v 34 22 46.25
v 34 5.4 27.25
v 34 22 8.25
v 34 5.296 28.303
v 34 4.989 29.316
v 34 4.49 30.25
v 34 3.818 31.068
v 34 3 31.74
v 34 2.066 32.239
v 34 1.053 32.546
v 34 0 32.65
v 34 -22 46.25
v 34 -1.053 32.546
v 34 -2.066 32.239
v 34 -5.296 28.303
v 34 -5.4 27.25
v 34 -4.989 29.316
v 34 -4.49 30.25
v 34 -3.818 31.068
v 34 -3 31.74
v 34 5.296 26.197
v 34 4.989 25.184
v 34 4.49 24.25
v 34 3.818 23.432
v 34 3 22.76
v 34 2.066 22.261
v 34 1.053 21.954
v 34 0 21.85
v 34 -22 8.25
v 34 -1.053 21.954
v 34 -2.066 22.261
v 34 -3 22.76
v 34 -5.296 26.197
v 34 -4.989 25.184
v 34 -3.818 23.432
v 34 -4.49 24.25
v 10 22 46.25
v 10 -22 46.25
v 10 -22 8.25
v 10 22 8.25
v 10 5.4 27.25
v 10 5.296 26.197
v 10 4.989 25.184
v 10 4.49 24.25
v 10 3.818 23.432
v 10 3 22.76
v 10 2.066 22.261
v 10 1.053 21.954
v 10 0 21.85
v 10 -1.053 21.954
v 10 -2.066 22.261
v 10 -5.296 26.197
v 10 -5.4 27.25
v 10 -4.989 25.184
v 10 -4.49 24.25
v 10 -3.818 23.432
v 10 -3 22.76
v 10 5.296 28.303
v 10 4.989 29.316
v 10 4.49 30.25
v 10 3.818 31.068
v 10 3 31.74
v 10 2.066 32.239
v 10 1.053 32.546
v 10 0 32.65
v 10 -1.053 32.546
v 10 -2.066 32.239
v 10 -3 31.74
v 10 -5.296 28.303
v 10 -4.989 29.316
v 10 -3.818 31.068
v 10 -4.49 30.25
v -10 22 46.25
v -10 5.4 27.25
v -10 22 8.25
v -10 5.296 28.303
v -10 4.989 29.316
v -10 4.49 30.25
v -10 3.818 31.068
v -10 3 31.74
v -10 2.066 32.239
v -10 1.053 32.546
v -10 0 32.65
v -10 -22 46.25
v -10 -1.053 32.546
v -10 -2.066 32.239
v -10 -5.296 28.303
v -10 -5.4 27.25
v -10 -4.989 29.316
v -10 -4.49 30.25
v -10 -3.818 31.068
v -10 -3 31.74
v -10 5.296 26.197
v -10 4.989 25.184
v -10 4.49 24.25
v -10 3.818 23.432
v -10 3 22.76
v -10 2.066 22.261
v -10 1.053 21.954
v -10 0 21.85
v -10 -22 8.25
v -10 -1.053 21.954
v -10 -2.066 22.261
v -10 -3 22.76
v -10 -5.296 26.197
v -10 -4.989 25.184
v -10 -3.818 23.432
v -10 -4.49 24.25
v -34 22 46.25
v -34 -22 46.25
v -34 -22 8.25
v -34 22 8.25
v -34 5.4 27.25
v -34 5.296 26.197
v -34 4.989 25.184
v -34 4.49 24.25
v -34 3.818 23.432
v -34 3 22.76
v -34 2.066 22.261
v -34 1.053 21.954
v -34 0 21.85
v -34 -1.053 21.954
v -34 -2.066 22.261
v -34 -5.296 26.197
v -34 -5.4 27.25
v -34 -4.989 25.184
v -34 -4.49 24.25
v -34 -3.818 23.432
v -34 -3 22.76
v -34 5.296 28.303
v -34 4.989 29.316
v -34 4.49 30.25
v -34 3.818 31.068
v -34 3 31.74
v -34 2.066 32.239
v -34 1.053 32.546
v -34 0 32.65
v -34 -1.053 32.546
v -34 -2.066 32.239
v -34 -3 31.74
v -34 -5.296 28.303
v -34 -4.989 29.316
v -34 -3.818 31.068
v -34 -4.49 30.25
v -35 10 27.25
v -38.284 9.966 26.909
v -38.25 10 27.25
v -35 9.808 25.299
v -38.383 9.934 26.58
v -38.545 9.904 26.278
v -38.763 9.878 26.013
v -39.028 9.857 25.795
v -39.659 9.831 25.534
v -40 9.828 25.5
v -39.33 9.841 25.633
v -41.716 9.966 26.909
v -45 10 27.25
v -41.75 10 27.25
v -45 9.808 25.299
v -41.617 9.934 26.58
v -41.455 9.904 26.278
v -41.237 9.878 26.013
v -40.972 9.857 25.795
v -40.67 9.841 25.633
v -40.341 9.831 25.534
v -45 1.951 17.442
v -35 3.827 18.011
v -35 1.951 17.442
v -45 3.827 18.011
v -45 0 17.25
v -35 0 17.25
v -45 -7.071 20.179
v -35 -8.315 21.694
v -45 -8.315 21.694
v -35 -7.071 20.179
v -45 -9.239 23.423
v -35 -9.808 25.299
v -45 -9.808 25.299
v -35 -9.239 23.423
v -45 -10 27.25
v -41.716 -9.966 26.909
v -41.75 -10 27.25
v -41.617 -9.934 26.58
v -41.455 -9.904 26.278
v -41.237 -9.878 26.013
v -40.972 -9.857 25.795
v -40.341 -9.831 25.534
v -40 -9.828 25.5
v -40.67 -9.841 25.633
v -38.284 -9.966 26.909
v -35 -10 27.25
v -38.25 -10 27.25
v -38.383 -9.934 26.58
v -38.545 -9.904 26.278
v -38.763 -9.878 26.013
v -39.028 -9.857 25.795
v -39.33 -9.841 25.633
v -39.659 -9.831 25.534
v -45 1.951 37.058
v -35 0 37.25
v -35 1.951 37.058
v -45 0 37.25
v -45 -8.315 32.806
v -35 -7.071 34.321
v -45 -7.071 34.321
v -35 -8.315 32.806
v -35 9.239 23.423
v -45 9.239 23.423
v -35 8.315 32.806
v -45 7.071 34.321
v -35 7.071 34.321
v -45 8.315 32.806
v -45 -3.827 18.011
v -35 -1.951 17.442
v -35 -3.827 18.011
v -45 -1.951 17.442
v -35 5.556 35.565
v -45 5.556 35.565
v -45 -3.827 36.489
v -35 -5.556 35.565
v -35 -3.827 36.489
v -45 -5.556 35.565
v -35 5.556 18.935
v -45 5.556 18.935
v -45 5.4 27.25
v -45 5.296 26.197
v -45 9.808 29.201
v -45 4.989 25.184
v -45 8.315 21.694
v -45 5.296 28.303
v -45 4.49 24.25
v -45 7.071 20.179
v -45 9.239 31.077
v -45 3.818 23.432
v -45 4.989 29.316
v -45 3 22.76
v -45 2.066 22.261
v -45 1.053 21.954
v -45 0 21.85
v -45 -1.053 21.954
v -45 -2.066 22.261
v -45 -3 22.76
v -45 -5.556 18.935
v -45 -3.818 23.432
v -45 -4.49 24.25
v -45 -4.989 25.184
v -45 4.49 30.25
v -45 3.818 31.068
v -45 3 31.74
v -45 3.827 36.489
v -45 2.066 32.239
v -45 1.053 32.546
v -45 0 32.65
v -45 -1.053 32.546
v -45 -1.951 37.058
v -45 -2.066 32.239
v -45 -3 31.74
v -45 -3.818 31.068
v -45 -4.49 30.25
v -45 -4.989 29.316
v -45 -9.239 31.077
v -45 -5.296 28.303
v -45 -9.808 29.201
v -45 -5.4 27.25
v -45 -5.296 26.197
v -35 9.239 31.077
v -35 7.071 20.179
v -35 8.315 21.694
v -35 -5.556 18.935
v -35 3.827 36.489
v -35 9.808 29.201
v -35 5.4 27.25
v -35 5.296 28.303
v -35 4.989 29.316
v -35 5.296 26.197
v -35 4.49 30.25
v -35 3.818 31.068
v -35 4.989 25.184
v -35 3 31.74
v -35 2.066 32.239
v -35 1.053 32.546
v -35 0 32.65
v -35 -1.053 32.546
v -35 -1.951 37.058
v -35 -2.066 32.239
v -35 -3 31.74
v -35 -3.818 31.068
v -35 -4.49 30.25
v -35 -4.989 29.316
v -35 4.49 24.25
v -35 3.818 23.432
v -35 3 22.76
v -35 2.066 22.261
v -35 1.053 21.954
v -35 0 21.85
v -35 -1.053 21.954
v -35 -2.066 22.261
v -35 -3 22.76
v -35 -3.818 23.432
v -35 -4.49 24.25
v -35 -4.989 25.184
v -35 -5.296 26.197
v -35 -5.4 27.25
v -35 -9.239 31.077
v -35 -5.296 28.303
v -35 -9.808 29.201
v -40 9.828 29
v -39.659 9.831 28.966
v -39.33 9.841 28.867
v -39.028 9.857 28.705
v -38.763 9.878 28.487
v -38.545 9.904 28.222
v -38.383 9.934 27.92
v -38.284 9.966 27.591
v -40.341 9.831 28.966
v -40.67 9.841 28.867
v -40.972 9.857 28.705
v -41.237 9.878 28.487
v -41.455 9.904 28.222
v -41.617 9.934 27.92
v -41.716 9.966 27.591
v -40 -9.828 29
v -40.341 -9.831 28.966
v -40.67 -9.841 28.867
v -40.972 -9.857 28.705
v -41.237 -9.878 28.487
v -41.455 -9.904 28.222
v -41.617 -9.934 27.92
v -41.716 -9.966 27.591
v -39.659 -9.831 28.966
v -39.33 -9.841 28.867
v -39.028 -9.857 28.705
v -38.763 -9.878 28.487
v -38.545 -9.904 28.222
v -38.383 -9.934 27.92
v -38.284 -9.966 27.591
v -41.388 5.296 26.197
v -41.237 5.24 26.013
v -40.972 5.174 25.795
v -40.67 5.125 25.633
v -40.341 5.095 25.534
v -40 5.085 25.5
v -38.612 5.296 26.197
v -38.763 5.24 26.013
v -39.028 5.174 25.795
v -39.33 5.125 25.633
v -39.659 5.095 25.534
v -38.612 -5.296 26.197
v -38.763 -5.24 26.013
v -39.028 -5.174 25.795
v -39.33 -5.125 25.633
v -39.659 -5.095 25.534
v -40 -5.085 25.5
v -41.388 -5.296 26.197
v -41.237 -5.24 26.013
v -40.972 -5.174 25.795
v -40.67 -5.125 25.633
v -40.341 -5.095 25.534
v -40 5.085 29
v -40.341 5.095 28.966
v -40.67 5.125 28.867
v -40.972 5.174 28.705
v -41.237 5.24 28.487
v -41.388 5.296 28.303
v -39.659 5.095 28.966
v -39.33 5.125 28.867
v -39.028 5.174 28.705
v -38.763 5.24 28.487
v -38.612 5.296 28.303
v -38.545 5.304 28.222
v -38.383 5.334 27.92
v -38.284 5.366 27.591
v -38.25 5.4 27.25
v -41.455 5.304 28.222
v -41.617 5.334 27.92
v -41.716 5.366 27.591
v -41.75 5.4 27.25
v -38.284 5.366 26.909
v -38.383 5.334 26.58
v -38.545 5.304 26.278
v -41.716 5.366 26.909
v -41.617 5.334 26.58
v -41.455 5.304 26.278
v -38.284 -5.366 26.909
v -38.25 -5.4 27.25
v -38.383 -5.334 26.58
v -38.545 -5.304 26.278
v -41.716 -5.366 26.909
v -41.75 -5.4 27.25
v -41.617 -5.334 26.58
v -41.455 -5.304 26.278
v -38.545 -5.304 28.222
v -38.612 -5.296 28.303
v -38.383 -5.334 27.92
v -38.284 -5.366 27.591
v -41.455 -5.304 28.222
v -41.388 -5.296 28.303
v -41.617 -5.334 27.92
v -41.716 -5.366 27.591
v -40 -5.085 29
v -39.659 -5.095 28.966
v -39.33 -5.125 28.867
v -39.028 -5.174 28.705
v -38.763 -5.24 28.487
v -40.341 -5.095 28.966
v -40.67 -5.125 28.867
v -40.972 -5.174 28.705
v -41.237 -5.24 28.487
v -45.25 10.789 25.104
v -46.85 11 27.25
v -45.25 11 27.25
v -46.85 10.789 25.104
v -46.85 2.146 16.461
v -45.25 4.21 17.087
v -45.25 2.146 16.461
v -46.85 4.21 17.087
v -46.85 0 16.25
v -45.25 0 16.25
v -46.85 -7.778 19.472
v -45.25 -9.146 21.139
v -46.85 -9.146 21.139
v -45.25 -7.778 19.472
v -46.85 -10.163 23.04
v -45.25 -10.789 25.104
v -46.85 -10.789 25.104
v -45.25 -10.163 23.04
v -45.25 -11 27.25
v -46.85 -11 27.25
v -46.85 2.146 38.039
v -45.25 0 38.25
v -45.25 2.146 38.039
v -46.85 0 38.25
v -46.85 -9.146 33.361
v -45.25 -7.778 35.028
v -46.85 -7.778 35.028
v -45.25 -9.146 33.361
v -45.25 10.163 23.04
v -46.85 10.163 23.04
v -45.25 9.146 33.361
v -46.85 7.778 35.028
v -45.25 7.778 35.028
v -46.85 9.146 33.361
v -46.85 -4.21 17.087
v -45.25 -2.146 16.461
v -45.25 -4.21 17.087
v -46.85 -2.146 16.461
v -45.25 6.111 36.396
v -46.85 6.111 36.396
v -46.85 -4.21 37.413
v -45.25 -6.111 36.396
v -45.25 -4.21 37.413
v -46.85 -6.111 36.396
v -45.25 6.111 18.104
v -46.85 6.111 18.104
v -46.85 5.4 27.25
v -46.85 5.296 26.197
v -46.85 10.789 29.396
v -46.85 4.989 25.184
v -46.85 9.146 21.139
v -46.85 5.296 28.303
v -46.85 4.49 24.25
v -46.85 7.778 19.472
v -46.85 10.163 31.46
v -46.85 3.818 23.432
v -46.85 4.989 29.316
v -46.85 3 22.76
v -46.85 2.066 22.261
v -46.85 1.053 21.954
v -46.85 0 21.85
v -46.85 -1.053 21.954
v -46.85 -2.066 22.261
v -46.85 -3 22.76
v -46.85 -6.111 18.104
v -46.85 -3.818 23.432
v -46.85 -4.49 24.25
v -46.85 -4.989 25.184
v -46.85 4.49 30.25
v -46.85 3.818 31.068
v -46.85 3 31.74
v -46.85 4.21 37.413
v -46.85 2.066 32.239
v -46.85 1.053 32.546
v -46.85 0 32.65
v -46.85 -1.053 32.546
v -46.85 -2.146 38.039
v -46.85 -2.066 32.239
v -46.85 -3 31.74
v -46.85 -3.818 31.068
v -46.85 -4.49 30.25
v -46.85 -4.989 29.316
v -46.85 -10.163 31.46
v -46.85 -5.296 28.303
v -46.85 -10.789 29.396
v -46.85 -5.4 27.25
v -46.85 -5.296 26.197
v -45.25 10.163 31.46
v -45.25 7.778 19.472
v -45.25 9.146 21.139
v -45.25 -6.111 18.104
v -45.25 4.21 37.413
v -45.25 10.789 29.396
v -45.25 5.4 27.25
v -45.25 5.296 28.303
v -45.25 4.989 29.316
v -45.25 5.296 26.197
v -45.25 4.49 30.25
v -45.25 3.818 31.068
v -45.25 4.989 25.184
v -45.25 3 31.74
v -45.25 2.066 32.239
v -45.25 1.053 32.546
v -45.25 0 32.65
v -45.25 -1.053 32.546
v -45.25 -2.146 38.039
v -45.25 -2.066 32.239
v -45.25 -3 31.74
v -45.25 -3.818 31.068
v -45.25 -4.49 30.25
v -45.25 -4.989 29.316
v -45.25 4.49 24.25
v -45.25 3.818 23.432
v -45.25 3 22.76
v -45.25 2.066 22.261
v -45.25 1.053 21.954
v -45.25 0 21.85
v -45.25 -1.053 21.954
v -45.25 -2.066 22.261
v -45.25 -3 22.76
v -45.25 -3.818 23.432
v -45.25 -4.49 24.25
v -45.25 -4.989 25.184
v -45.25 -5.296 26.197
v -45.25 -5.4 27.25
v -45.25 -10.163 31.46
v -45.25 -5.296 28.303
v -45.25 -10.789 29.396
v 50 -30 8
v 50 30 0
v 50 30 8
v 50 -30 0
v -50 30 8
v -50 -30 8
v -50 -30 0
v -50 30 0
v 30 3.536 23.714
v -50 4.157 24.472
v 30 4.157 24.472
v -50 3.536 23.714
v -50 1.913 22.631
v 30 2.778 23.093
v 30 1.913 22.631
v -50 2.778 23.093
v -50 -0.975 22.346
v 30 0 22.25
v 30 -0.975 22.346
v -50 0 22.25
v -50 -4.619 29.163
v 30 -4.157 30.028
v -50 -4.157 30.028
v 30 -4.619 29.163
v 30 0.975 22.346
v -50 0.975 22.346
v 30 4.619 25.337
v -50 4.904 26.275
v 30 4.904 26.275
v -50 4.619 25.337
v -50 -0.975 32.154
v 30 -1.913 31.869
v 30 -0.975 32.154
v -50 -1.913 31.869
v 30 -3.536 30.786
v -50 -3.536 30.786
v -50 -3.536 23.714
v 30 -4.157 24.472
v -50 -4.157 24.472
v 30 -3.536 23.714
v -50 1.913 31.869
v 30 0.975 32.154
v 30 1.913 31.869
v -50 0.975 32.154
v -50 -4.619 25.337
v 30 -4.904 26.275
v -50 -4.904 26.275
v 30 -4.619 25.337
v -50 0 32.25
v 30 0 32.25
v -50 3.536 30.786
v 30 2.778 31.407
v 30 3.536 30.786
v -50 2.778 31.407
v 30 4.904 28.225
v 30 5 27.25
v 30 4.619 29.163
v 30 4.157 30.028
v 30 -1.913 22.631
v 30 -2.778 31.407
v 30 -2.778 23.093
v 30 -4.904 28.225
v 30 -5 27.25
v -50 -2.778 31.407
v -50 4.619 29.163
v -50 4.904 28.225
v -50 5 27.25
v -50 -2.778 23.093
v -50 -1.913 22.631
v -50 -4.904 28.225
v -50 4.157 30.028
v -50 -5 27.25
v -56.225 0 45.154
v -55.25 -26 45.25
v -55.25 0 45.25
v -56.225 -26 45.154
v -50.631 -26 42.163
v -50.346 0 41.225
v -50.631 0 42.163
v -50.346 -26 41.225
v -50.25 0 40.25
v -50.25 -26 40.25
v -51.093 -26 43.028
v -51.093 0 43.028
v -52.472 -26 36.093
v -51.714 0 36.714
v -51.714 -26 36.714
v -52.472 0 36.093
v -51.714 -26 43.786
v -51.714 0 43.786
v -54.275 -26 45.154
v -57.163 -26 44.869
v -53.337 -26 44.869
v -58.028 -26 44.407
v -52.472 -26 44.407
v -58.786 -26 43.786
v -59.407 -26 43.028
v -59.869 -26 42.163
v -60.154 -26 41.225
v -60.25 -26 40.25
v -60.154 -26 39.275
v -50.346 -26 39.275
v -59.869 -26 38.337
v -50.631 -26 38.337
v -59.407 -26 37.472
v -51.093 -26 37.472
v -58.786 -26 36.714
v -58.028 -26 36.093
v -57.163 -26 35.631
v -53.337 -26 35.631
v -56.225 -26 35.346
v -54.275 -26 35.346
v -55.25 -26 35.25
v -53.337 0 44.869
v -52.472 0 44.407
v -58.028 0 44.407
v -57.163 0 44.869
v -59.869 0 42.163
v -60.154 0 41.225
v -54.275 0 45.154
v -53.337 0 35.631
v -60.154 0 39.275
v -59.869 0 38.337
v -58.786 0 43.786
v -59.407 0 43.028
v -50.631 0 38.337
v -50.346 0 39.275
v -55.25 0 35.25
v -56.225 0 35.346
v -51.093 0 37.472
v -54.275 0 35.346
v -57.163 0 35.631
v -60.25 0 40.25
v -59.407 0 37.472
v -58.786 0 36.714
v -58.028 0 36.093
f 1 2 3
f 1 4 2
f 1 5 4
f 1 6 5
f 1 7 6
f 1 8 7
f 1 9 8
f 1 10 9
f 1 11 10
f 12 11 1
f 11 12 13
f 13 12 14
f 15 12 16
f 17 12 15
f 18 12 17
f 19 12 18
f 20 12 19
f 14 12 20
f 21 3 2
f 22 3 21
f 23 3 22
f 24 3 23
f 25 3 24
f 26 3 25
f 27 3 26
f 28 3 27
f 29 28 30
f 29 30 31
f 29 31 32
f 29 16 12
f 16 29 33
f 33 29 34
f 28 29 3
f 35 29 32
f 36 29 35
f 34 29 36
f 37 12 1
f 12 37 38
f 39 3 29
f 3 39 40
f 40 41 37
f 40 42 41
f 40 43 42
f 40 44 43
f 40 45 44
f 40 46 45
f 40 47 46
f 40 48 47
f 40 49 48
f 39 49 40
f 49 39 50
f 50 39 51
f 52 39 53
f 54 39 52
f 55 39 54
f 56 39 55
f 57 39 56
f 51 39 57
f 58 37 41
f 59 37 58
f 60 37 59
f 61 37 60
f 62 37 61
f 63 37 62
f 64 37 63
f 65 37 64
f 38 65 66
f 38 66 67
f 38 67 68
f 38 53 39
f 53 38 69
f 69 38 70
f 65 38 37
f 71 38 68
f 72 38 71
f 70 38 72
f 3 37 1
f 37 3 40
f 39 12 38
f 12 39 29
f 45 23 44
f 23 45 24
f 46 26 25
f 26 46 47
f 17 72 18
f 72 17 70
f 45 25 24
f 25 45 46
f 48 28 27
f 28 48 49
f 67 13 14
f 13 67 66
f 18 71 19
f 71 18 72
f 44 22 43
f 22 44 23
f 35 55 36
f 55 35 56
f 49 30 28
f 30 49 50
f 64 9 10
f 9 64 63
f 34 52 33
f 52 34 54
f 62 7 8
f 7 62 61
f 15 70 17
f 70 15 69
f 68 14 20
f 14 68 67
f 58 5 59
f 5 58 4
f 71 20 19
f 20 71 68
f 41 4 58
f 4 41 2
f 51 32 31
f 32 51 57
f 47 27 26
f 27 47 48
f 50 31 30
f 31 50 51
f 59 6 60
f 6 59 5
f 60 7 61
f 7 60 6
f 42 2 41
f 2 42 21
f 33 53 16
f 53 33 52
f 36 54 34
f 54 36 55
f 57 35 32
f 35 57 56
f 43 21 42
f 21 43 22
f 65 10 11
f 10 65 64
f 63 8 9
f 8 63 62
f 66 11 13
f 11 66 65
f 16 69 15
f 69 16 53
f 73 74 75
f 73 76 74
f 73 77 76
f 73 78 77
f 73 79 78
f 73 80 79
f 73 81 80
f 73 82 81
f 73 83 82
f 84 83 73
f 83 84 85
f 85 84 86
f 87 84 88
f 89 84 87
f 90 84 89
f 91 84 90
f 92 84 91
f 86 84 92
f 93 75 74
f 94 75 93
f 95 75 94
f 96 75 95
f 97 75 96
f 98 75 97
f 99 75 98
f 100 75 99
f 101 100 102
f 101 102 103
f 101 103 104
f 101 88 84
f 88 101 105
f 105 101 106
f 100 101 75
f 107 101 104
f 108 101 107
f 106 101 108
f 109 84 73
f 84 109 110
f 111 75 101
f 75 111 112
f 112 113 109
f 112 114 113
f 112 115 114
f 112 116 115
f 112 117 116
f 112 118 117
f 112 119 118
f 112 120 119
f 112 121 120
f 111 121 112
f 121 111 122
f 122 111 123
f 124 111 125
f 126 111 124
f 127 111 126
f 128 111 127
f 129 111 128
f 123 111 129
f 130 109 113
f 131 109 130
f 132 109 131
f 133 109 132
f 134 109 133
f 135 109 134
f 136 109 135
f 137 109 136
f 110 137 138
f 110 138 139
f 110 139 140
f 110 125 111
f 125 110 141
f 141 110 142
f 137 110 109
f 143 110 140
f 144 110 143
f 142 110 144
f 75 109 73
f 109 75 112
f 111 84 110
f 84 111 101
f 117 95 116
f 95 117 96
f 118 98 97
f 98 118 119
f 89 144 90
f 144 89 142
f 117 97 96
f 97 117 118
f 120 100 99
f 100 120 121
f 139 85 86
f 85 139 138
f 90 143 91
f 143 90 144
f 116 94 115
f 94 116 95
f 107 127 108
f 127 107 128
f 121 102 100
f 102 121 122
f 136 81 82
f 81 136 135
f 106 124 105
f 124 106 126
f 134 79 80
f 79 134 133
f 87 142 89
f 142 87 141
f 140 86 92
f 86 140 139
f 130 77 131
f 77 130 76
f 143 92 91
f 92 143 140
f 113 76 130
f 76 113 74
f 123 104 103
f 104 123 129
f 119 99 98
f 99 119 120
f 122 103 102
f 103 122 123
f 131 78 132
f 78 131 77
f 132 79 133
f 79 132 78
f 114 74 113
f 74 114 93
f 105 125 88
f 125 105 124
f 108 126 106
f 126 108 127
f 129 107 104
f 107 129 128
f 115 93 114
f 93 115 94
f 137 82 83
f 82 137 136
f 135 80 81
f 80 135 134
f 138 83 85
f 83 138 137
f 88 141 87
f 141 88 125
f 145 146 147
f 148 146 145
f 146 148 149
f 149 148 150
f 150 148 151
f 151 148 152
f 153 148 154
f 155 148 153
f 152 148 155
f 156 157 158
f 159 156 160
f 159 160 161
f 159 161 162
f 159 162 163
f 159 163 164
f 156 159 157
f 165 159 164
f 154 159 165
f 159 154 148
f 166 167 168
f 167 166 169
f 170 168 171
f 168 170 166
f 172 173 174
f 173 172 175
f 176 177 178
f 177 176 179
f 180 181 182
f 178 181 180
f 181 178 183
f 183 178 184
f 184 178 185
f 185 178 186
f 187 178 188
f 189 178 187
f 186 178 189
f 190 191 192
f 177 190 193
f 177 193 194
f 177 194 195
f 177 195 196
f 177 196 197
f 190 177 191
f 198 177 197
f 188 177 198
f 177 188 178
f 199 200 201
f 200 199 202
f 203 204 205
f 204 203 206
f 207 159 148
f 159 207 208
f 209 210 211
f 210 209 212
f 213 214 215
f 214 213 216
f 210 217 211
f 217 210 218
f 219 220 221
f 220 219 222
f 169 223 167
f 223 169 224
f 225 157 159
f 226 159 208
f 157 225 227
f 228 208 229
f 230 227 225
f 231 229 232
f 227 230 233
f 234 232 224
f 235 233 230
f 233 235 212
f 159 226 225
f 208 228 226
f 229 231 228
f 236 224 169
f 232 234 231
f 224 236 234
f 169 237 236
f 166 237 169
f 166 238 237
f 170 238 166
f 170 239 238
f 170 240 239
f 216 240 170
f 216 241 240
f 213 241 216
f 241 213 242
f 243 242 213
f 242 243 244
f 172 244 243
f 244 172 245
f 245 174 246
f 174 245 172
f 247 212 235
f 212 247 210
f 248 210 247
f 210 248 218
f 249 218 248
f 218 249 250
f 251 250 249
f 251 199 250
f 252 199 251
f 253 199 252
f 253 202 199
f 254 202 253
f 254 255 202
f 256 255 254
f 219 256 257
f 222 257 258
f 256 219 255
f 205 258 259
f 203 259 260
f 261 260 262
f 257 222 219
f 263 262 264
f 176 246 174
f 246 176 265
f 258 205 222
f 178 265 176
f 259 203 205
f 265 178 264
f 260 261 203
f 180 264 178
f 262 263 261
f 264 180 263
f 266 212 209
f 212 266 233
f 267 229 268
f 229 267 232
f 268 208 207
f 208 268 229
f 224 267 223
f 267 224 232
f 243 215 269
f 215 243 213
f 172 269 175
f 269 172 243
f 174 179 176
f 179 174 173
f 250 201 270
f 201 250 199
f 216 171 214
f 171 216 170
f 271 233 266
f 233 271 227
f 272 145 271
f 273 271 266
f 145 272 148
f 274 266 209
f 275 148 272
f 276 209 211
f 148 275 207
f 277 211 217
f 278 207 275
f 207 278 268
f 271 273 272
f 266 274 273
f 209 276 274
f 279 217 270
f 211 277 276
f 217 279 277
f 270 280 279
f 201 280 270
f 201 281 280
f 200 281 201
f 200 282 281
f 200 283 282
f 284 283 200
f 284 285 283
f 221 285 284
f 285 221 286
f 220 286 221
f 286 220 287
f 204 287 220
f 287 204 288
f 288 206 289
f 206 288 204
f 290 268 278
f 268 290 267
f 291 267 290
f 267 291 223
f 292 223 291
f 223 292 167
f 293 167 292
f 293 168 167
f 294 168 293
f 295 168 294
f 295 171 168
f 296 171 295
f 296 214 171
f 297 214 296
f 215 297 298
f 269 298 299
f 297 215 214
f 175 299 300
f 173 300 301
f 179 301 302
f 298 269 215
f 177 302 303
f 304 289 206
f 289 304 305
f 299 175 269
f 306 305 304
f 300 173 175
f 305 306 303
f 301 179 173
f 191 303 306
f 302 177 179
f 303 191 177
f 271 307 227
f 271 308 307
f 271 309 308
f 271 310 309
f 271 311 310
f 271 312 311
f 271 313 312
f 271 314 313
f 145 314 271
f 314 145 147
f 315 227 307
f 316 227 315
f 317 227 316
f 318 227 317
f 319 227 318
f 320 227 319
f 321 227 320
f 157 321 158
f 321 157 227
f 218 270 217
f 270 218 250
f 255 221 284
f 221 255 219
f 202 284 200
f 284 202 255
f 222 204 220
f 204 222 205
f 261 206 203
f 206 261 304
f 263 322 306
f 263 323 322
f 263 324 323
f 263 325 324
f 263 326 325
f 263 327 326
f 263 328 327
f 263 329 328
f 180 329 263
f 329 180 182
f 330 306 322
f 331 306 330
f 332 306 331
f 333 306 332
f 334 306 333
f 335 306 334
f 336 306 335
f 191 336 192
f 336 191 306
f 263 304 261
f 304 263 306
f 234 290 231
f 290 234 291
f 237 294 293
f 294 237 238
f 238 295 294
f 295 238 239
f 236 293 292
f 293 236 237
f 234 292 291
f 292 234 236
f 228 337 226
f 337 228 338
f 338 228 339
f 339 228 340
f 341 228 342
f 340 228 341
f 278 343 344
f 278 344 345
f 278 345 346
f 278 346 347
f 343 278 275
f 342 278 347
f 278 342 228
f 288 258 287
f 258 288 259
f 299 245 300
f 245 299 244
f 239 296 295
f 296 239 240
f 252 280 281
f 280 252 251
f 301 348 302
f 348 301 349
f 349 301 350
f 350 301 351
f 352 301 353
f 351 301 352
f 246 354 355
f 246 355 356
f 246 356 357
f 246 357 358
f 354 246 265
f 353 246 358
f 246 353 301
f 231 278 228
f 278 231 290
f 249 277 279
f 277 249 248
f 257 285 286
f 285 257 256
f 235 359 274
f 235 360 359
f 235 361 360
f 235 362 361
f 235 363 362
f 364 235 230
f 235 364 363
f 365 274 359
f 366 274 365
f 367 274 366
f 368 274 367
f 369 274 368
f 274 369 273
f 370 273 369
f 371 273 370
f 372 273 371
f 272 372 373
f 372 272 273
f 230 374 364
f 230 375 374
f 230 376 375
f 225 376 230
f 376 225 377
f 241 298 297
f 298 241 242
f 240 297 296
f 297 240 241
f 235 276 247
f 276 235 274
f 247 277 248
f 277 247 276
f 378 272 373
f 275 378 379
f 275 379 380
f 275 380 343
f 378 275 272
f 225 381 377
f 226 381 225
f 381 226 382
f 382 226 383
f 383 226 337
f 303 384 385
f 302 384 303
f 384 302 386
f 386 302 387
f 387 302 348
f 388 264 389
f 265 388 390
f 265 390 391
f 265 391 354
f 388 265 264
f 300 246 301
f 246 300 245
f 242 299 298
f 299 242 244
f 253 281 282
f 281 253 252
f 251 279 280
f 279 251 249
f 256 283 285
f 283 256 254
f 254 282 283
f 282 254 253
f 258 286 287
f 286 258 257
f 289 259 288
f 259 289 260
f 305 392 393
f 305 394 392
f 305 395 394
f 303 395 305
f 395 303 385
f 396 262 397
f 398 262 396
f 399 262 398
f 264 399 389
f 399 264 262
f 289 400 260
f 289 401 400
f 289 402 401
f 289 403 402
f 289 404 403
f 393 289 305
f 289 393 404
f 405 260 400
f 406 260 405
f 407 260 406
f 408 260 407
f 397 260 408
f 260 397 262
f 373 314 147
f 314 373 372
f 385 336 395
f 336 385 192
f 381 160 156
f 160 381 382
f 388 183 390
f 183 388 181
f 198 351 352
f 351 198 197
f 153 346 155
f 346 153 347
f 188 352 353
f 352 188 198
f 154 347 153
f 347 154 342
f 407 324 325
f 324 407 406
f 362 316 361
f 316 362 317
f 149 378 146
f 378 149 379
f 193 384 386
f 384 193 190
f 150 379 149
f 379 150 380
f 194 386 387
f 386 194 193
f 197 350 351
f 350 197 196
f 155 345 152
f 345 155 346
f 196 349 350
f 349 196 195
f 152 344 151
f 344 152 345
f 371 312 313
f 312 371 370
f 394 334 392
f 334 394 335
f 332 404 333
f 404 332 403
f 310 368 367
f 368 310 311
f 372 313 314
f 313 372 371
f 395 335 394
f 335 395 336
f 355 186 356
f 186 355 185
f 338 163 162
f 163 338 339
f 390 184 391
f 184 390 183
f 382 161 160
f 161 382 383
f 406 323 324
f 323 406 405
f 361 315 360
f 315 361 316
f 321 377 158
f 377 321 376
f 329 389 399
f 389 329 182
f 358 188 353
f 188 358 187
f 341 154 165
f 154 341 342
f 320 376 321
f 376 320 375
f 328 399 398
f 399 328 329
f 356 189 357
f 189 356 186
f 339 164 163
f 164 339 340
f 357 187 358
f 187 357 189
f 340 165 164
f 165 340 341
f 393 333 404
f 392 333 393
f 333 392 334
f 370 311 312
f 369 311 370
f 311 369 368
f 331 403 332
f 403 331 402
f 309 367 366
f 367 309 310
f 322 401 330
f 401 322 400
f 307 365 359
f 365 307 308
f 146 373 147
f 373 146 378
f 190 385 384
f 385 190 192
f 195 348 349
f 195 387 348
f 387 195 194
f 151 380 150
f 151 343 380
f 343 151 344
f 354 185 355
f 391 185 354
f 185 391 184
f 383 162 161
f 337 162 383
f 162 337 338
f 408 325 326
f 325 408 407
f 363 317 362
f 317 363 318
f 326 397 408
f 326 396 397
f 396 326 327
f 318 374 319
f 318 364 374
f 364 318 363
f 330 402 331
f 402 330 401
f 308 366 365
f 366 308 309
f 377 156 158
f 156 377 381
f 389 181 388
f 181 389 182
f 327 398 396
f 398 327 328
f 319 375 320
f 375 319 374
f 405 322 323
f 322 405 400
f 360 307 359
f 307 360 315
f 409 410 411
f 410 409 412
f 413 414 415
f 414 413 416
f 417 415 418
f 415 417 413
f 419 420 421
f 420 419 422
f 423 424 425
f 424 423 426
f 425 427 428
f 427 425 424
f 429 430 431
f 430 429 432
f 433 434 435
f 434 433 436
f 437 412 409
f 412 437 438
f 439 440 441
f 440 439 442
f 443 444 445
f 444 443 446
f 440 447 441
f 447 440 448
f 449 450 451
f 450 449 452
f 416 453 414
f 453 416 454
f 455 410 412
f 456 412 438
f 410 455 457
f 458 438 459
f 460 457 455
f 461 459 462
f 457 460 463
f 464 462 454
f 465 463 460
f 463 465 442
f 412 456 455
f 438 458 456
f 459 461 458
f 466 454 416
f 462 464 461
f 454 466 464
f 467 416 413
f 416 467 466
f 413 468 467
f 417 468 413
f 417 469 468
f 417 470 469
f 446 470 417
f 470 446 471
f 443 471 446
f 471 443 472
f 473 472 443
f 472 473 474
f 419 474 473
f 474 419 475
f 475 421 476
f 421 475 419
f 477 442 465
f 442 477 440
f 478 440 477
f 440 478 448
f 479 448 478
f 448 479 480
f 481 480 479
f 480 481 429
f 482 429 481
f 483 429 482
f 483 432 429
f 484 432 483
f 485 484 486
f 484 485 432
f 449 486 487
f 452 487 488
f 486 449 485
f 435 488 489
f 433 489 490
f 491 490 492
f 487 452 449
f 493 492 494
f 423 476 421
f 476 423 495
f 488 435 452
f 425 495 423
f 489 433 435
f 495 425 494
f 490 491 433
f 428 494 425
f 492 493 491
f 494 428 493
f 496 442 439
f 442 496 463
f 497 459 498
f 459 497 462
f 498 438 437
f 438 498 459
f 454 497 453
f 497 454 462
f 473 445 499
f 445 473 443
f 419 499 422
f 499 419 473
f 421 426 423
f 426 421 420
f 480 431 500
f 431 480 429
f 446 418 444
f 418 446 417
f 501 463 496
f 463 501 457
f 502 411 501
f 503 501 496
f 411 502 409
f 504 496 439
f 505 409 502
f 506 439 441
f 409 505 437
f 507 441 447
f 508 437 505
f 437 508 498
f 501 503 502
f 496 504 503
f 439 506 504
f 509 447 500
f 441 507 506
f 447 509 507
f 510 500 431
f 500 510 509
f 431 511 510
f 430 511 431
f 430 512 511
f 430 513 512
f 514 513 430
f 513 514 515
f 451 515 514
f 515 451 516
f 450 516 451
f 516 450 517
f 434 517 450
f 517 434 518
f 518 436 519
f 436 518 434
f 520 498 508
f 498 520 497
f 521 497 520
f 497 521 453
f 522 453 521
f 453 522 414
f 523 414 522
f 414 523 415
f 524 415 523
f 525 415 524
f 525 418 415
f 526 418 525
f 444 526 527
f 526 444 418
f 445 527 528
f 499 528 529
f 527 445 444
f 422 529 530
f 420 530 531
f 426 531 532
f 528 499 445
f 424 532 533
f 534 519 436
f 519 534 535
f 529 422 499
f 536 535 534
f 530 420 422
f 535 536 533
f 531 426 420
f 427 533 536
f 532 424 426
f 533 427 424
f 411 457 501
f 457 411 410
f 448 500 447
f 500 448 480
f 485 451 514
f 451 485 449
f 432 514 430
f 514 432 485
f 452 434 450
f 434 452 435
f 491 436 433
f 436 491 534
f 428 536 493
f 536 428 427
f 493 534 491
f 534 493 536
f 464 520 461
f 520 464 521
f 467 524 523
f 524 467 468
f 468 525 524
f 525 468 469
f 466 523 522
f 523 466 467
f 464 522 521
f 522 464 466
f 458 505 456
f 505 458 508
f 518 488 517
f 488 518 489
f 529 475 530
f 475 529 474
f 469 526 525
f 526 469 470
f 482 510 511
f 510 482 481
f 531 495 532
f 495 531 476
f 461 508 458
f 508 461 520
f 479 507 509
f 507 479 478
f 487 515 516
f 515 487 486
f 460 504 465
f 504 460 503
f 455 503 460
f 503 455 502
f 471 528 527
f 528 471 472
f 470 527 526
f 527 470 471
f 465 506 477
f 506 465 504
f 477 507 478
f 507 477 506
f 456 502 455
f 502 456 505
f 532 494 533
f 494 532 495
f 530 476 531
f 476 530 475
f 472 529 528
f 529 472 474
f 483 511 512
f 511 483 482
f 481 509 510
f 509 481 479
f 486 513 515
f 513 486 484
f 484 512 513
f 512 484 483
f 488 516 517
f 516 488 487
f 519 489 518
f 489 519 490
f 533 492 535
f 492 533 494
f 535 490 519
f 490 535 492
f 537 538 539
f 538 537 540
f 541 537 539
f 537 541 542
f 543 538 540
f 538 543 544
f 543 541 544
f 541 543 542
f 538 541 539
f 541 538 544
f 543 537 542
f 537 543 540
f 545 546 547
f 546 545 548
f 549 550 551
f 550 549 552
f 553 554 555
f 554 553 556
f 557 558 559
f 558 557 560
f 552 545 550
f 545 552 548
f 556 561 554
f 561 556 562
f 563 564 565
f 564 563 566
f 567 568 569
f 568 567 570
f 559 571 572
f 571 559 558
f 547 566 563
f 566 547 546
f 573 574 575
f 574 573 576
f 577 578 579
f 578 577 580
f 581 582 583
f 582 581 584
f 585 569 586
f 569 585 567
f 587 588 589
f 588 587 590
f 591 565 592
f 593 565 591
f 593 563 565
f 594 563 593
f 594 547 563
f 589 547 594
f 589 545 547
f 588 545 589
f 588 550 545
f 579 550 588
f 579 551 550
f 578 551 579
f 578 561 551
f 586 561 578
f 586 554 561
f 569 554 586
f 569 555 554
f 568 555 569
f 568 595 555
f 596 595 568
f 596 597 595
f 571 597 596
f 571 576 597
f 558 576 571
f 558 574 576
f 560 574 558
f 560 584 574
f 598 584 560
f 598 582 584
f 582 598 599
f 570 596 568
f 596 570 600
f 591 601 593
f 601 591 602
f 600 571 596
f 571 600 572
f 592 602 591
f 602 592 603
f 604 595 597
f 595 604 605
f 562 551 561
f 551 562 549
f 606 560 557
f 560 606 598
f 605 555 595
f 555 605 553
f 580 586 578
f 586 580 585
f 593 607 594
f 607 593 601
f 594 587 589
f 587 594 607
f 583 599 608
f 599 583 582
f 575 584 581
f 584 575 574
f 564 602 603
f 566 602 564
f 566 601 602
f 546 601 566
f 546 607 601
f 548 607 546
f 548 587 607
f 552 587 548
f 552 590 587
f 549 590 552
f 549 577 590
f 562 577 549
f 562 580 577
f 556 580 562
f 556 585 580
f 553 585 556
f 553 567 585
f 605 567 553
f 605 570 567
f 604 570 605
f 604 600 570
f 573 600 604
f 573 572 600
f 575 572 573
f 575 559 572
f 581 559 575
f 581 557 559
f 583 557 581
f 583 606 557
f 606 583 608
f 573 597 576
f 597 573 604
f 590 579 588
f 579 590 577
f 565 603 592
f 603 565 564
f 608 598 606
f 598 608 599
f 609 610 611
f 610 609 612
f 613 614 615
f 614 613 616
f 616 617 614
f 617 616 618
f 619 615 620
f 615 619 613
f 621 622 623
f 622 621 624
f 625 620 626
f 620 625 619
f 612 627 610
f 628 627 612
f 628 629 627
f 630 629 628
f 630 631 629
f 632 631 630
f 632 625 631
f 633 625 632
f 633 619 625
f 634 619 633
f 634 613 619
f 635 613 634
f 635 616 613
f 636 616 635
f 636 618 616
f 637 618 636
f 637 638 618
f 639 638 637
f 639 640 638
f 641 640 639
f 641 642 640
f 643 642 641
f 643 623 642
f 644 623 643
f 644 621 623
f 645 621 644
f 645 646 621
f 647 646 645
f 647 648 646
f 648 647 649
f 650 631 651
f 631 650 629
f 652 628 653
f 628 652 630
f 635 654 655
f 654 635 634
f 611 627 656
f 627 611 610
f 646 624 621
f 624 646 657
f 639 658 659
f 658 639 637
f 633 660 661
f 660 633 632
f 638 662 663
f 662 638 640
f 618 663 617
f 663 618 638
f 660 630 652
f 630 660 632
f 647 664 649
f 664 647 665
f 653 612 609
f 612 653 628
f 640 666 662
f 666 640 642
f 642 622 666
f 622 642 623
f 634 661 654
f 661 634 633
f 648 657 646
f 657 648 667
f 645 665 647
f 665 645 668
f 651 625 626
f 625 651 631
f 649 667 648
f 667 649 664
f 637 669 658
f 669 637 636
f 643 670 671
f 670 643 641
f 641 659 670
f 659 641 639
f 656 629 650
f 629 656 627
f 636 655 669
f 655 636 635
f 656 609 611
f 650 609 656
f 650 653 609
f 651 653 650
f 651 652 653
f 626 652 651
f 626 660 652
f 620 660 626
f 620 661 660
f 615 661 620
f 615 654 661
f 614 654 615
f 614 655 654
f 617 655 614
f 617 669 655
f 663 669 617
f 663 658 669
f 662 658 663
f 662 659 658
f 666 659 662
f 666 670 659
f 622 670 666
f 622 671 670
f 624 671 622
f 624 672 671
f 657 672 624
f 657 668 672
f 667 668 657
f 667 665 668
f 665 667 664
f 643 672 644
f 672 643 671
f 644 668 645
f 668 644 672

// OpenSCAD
$fn = 32;

// ------------------------------------------------------------------------
// Machine vise: screw d10, jaws 24 x 38 mm
// Every part is its own module, assembly() places every instance.
// ------------------------------------------------------------------------

// --- part 1 ---
module vise_bed() {
  difference() {
    translate([-50, -30, 0]) cube([100, 60, 8]);
  }
}

// --- part 2 ---
module vise_jaw() {
  difference() {
    translate([-12, -22, 0]) cube([24, 44, 38]);
    translate([0, 0, 19]) rotate([0, 90, 0]) cylinder(h = 26, d = 10.8, center = true);
  }
}

// --- part 3 ---
module vise_screw() {
  translate([0, 0, -40]) cylinder(h = 80, d = 10);
}

// --- part 4 ---
module screw_collar() {
  difference() {
    cylinder(h = 10, d = 20);
    translate([0, 0, -1]) cylinder(h = 12, d = 10.8);
    translate([0, 0, 5]) rotate([90, 0, 0]) cylinder(h = 22, d = 3.5, center = true);
  }
}

// --- part 5 ---
module screw_washer() {
  difference() {
      translate([0, 0, 0]) cylinder(h = 1.6, d = 22);
      translate([0, 0, -1]) cylinder(h = 3.6, d = 10.8);
    }
}

// --- part 6 ---
module vise_handle() {
  cylinder(h = 26, d = 10);
}

// --- assembly ---
module assembly() {
  color([0.80, 0.24, 0.20]) translate([0, 0, 0]) rotate([0, 0, 0]) vise_bed();
  color([0.20, 0.45, 0.75]) translate([22, 0, 8.25]) rotate([0, 0, 0]) vise_jaw();
  color([0.25, 0.62, 0.32]) translate([-22, 0, 8.25]) rotate([0, 0, 0]) vise_jaw();
  color([0.92, 0.70, 0.18]) translate([-10, 0, 27.25]) rotate([0, 90, 0]) vise_screw();
  color([0.58, 0.35, 0.70]) translate([-45, 0, 27.25]) rotate([0, 90, 0]) screw_collar();
  color([0.16, 0.66, 0.66]) translate([-46.85, 0, 27.25]) rotate([0, 90, 0]) screw_washer();
  color([0.85, 0.48, 0.18]) translate([-55.25, 0, 40.25]) rotate([90, 0, 0]) vise_handle();
}

assembly();
